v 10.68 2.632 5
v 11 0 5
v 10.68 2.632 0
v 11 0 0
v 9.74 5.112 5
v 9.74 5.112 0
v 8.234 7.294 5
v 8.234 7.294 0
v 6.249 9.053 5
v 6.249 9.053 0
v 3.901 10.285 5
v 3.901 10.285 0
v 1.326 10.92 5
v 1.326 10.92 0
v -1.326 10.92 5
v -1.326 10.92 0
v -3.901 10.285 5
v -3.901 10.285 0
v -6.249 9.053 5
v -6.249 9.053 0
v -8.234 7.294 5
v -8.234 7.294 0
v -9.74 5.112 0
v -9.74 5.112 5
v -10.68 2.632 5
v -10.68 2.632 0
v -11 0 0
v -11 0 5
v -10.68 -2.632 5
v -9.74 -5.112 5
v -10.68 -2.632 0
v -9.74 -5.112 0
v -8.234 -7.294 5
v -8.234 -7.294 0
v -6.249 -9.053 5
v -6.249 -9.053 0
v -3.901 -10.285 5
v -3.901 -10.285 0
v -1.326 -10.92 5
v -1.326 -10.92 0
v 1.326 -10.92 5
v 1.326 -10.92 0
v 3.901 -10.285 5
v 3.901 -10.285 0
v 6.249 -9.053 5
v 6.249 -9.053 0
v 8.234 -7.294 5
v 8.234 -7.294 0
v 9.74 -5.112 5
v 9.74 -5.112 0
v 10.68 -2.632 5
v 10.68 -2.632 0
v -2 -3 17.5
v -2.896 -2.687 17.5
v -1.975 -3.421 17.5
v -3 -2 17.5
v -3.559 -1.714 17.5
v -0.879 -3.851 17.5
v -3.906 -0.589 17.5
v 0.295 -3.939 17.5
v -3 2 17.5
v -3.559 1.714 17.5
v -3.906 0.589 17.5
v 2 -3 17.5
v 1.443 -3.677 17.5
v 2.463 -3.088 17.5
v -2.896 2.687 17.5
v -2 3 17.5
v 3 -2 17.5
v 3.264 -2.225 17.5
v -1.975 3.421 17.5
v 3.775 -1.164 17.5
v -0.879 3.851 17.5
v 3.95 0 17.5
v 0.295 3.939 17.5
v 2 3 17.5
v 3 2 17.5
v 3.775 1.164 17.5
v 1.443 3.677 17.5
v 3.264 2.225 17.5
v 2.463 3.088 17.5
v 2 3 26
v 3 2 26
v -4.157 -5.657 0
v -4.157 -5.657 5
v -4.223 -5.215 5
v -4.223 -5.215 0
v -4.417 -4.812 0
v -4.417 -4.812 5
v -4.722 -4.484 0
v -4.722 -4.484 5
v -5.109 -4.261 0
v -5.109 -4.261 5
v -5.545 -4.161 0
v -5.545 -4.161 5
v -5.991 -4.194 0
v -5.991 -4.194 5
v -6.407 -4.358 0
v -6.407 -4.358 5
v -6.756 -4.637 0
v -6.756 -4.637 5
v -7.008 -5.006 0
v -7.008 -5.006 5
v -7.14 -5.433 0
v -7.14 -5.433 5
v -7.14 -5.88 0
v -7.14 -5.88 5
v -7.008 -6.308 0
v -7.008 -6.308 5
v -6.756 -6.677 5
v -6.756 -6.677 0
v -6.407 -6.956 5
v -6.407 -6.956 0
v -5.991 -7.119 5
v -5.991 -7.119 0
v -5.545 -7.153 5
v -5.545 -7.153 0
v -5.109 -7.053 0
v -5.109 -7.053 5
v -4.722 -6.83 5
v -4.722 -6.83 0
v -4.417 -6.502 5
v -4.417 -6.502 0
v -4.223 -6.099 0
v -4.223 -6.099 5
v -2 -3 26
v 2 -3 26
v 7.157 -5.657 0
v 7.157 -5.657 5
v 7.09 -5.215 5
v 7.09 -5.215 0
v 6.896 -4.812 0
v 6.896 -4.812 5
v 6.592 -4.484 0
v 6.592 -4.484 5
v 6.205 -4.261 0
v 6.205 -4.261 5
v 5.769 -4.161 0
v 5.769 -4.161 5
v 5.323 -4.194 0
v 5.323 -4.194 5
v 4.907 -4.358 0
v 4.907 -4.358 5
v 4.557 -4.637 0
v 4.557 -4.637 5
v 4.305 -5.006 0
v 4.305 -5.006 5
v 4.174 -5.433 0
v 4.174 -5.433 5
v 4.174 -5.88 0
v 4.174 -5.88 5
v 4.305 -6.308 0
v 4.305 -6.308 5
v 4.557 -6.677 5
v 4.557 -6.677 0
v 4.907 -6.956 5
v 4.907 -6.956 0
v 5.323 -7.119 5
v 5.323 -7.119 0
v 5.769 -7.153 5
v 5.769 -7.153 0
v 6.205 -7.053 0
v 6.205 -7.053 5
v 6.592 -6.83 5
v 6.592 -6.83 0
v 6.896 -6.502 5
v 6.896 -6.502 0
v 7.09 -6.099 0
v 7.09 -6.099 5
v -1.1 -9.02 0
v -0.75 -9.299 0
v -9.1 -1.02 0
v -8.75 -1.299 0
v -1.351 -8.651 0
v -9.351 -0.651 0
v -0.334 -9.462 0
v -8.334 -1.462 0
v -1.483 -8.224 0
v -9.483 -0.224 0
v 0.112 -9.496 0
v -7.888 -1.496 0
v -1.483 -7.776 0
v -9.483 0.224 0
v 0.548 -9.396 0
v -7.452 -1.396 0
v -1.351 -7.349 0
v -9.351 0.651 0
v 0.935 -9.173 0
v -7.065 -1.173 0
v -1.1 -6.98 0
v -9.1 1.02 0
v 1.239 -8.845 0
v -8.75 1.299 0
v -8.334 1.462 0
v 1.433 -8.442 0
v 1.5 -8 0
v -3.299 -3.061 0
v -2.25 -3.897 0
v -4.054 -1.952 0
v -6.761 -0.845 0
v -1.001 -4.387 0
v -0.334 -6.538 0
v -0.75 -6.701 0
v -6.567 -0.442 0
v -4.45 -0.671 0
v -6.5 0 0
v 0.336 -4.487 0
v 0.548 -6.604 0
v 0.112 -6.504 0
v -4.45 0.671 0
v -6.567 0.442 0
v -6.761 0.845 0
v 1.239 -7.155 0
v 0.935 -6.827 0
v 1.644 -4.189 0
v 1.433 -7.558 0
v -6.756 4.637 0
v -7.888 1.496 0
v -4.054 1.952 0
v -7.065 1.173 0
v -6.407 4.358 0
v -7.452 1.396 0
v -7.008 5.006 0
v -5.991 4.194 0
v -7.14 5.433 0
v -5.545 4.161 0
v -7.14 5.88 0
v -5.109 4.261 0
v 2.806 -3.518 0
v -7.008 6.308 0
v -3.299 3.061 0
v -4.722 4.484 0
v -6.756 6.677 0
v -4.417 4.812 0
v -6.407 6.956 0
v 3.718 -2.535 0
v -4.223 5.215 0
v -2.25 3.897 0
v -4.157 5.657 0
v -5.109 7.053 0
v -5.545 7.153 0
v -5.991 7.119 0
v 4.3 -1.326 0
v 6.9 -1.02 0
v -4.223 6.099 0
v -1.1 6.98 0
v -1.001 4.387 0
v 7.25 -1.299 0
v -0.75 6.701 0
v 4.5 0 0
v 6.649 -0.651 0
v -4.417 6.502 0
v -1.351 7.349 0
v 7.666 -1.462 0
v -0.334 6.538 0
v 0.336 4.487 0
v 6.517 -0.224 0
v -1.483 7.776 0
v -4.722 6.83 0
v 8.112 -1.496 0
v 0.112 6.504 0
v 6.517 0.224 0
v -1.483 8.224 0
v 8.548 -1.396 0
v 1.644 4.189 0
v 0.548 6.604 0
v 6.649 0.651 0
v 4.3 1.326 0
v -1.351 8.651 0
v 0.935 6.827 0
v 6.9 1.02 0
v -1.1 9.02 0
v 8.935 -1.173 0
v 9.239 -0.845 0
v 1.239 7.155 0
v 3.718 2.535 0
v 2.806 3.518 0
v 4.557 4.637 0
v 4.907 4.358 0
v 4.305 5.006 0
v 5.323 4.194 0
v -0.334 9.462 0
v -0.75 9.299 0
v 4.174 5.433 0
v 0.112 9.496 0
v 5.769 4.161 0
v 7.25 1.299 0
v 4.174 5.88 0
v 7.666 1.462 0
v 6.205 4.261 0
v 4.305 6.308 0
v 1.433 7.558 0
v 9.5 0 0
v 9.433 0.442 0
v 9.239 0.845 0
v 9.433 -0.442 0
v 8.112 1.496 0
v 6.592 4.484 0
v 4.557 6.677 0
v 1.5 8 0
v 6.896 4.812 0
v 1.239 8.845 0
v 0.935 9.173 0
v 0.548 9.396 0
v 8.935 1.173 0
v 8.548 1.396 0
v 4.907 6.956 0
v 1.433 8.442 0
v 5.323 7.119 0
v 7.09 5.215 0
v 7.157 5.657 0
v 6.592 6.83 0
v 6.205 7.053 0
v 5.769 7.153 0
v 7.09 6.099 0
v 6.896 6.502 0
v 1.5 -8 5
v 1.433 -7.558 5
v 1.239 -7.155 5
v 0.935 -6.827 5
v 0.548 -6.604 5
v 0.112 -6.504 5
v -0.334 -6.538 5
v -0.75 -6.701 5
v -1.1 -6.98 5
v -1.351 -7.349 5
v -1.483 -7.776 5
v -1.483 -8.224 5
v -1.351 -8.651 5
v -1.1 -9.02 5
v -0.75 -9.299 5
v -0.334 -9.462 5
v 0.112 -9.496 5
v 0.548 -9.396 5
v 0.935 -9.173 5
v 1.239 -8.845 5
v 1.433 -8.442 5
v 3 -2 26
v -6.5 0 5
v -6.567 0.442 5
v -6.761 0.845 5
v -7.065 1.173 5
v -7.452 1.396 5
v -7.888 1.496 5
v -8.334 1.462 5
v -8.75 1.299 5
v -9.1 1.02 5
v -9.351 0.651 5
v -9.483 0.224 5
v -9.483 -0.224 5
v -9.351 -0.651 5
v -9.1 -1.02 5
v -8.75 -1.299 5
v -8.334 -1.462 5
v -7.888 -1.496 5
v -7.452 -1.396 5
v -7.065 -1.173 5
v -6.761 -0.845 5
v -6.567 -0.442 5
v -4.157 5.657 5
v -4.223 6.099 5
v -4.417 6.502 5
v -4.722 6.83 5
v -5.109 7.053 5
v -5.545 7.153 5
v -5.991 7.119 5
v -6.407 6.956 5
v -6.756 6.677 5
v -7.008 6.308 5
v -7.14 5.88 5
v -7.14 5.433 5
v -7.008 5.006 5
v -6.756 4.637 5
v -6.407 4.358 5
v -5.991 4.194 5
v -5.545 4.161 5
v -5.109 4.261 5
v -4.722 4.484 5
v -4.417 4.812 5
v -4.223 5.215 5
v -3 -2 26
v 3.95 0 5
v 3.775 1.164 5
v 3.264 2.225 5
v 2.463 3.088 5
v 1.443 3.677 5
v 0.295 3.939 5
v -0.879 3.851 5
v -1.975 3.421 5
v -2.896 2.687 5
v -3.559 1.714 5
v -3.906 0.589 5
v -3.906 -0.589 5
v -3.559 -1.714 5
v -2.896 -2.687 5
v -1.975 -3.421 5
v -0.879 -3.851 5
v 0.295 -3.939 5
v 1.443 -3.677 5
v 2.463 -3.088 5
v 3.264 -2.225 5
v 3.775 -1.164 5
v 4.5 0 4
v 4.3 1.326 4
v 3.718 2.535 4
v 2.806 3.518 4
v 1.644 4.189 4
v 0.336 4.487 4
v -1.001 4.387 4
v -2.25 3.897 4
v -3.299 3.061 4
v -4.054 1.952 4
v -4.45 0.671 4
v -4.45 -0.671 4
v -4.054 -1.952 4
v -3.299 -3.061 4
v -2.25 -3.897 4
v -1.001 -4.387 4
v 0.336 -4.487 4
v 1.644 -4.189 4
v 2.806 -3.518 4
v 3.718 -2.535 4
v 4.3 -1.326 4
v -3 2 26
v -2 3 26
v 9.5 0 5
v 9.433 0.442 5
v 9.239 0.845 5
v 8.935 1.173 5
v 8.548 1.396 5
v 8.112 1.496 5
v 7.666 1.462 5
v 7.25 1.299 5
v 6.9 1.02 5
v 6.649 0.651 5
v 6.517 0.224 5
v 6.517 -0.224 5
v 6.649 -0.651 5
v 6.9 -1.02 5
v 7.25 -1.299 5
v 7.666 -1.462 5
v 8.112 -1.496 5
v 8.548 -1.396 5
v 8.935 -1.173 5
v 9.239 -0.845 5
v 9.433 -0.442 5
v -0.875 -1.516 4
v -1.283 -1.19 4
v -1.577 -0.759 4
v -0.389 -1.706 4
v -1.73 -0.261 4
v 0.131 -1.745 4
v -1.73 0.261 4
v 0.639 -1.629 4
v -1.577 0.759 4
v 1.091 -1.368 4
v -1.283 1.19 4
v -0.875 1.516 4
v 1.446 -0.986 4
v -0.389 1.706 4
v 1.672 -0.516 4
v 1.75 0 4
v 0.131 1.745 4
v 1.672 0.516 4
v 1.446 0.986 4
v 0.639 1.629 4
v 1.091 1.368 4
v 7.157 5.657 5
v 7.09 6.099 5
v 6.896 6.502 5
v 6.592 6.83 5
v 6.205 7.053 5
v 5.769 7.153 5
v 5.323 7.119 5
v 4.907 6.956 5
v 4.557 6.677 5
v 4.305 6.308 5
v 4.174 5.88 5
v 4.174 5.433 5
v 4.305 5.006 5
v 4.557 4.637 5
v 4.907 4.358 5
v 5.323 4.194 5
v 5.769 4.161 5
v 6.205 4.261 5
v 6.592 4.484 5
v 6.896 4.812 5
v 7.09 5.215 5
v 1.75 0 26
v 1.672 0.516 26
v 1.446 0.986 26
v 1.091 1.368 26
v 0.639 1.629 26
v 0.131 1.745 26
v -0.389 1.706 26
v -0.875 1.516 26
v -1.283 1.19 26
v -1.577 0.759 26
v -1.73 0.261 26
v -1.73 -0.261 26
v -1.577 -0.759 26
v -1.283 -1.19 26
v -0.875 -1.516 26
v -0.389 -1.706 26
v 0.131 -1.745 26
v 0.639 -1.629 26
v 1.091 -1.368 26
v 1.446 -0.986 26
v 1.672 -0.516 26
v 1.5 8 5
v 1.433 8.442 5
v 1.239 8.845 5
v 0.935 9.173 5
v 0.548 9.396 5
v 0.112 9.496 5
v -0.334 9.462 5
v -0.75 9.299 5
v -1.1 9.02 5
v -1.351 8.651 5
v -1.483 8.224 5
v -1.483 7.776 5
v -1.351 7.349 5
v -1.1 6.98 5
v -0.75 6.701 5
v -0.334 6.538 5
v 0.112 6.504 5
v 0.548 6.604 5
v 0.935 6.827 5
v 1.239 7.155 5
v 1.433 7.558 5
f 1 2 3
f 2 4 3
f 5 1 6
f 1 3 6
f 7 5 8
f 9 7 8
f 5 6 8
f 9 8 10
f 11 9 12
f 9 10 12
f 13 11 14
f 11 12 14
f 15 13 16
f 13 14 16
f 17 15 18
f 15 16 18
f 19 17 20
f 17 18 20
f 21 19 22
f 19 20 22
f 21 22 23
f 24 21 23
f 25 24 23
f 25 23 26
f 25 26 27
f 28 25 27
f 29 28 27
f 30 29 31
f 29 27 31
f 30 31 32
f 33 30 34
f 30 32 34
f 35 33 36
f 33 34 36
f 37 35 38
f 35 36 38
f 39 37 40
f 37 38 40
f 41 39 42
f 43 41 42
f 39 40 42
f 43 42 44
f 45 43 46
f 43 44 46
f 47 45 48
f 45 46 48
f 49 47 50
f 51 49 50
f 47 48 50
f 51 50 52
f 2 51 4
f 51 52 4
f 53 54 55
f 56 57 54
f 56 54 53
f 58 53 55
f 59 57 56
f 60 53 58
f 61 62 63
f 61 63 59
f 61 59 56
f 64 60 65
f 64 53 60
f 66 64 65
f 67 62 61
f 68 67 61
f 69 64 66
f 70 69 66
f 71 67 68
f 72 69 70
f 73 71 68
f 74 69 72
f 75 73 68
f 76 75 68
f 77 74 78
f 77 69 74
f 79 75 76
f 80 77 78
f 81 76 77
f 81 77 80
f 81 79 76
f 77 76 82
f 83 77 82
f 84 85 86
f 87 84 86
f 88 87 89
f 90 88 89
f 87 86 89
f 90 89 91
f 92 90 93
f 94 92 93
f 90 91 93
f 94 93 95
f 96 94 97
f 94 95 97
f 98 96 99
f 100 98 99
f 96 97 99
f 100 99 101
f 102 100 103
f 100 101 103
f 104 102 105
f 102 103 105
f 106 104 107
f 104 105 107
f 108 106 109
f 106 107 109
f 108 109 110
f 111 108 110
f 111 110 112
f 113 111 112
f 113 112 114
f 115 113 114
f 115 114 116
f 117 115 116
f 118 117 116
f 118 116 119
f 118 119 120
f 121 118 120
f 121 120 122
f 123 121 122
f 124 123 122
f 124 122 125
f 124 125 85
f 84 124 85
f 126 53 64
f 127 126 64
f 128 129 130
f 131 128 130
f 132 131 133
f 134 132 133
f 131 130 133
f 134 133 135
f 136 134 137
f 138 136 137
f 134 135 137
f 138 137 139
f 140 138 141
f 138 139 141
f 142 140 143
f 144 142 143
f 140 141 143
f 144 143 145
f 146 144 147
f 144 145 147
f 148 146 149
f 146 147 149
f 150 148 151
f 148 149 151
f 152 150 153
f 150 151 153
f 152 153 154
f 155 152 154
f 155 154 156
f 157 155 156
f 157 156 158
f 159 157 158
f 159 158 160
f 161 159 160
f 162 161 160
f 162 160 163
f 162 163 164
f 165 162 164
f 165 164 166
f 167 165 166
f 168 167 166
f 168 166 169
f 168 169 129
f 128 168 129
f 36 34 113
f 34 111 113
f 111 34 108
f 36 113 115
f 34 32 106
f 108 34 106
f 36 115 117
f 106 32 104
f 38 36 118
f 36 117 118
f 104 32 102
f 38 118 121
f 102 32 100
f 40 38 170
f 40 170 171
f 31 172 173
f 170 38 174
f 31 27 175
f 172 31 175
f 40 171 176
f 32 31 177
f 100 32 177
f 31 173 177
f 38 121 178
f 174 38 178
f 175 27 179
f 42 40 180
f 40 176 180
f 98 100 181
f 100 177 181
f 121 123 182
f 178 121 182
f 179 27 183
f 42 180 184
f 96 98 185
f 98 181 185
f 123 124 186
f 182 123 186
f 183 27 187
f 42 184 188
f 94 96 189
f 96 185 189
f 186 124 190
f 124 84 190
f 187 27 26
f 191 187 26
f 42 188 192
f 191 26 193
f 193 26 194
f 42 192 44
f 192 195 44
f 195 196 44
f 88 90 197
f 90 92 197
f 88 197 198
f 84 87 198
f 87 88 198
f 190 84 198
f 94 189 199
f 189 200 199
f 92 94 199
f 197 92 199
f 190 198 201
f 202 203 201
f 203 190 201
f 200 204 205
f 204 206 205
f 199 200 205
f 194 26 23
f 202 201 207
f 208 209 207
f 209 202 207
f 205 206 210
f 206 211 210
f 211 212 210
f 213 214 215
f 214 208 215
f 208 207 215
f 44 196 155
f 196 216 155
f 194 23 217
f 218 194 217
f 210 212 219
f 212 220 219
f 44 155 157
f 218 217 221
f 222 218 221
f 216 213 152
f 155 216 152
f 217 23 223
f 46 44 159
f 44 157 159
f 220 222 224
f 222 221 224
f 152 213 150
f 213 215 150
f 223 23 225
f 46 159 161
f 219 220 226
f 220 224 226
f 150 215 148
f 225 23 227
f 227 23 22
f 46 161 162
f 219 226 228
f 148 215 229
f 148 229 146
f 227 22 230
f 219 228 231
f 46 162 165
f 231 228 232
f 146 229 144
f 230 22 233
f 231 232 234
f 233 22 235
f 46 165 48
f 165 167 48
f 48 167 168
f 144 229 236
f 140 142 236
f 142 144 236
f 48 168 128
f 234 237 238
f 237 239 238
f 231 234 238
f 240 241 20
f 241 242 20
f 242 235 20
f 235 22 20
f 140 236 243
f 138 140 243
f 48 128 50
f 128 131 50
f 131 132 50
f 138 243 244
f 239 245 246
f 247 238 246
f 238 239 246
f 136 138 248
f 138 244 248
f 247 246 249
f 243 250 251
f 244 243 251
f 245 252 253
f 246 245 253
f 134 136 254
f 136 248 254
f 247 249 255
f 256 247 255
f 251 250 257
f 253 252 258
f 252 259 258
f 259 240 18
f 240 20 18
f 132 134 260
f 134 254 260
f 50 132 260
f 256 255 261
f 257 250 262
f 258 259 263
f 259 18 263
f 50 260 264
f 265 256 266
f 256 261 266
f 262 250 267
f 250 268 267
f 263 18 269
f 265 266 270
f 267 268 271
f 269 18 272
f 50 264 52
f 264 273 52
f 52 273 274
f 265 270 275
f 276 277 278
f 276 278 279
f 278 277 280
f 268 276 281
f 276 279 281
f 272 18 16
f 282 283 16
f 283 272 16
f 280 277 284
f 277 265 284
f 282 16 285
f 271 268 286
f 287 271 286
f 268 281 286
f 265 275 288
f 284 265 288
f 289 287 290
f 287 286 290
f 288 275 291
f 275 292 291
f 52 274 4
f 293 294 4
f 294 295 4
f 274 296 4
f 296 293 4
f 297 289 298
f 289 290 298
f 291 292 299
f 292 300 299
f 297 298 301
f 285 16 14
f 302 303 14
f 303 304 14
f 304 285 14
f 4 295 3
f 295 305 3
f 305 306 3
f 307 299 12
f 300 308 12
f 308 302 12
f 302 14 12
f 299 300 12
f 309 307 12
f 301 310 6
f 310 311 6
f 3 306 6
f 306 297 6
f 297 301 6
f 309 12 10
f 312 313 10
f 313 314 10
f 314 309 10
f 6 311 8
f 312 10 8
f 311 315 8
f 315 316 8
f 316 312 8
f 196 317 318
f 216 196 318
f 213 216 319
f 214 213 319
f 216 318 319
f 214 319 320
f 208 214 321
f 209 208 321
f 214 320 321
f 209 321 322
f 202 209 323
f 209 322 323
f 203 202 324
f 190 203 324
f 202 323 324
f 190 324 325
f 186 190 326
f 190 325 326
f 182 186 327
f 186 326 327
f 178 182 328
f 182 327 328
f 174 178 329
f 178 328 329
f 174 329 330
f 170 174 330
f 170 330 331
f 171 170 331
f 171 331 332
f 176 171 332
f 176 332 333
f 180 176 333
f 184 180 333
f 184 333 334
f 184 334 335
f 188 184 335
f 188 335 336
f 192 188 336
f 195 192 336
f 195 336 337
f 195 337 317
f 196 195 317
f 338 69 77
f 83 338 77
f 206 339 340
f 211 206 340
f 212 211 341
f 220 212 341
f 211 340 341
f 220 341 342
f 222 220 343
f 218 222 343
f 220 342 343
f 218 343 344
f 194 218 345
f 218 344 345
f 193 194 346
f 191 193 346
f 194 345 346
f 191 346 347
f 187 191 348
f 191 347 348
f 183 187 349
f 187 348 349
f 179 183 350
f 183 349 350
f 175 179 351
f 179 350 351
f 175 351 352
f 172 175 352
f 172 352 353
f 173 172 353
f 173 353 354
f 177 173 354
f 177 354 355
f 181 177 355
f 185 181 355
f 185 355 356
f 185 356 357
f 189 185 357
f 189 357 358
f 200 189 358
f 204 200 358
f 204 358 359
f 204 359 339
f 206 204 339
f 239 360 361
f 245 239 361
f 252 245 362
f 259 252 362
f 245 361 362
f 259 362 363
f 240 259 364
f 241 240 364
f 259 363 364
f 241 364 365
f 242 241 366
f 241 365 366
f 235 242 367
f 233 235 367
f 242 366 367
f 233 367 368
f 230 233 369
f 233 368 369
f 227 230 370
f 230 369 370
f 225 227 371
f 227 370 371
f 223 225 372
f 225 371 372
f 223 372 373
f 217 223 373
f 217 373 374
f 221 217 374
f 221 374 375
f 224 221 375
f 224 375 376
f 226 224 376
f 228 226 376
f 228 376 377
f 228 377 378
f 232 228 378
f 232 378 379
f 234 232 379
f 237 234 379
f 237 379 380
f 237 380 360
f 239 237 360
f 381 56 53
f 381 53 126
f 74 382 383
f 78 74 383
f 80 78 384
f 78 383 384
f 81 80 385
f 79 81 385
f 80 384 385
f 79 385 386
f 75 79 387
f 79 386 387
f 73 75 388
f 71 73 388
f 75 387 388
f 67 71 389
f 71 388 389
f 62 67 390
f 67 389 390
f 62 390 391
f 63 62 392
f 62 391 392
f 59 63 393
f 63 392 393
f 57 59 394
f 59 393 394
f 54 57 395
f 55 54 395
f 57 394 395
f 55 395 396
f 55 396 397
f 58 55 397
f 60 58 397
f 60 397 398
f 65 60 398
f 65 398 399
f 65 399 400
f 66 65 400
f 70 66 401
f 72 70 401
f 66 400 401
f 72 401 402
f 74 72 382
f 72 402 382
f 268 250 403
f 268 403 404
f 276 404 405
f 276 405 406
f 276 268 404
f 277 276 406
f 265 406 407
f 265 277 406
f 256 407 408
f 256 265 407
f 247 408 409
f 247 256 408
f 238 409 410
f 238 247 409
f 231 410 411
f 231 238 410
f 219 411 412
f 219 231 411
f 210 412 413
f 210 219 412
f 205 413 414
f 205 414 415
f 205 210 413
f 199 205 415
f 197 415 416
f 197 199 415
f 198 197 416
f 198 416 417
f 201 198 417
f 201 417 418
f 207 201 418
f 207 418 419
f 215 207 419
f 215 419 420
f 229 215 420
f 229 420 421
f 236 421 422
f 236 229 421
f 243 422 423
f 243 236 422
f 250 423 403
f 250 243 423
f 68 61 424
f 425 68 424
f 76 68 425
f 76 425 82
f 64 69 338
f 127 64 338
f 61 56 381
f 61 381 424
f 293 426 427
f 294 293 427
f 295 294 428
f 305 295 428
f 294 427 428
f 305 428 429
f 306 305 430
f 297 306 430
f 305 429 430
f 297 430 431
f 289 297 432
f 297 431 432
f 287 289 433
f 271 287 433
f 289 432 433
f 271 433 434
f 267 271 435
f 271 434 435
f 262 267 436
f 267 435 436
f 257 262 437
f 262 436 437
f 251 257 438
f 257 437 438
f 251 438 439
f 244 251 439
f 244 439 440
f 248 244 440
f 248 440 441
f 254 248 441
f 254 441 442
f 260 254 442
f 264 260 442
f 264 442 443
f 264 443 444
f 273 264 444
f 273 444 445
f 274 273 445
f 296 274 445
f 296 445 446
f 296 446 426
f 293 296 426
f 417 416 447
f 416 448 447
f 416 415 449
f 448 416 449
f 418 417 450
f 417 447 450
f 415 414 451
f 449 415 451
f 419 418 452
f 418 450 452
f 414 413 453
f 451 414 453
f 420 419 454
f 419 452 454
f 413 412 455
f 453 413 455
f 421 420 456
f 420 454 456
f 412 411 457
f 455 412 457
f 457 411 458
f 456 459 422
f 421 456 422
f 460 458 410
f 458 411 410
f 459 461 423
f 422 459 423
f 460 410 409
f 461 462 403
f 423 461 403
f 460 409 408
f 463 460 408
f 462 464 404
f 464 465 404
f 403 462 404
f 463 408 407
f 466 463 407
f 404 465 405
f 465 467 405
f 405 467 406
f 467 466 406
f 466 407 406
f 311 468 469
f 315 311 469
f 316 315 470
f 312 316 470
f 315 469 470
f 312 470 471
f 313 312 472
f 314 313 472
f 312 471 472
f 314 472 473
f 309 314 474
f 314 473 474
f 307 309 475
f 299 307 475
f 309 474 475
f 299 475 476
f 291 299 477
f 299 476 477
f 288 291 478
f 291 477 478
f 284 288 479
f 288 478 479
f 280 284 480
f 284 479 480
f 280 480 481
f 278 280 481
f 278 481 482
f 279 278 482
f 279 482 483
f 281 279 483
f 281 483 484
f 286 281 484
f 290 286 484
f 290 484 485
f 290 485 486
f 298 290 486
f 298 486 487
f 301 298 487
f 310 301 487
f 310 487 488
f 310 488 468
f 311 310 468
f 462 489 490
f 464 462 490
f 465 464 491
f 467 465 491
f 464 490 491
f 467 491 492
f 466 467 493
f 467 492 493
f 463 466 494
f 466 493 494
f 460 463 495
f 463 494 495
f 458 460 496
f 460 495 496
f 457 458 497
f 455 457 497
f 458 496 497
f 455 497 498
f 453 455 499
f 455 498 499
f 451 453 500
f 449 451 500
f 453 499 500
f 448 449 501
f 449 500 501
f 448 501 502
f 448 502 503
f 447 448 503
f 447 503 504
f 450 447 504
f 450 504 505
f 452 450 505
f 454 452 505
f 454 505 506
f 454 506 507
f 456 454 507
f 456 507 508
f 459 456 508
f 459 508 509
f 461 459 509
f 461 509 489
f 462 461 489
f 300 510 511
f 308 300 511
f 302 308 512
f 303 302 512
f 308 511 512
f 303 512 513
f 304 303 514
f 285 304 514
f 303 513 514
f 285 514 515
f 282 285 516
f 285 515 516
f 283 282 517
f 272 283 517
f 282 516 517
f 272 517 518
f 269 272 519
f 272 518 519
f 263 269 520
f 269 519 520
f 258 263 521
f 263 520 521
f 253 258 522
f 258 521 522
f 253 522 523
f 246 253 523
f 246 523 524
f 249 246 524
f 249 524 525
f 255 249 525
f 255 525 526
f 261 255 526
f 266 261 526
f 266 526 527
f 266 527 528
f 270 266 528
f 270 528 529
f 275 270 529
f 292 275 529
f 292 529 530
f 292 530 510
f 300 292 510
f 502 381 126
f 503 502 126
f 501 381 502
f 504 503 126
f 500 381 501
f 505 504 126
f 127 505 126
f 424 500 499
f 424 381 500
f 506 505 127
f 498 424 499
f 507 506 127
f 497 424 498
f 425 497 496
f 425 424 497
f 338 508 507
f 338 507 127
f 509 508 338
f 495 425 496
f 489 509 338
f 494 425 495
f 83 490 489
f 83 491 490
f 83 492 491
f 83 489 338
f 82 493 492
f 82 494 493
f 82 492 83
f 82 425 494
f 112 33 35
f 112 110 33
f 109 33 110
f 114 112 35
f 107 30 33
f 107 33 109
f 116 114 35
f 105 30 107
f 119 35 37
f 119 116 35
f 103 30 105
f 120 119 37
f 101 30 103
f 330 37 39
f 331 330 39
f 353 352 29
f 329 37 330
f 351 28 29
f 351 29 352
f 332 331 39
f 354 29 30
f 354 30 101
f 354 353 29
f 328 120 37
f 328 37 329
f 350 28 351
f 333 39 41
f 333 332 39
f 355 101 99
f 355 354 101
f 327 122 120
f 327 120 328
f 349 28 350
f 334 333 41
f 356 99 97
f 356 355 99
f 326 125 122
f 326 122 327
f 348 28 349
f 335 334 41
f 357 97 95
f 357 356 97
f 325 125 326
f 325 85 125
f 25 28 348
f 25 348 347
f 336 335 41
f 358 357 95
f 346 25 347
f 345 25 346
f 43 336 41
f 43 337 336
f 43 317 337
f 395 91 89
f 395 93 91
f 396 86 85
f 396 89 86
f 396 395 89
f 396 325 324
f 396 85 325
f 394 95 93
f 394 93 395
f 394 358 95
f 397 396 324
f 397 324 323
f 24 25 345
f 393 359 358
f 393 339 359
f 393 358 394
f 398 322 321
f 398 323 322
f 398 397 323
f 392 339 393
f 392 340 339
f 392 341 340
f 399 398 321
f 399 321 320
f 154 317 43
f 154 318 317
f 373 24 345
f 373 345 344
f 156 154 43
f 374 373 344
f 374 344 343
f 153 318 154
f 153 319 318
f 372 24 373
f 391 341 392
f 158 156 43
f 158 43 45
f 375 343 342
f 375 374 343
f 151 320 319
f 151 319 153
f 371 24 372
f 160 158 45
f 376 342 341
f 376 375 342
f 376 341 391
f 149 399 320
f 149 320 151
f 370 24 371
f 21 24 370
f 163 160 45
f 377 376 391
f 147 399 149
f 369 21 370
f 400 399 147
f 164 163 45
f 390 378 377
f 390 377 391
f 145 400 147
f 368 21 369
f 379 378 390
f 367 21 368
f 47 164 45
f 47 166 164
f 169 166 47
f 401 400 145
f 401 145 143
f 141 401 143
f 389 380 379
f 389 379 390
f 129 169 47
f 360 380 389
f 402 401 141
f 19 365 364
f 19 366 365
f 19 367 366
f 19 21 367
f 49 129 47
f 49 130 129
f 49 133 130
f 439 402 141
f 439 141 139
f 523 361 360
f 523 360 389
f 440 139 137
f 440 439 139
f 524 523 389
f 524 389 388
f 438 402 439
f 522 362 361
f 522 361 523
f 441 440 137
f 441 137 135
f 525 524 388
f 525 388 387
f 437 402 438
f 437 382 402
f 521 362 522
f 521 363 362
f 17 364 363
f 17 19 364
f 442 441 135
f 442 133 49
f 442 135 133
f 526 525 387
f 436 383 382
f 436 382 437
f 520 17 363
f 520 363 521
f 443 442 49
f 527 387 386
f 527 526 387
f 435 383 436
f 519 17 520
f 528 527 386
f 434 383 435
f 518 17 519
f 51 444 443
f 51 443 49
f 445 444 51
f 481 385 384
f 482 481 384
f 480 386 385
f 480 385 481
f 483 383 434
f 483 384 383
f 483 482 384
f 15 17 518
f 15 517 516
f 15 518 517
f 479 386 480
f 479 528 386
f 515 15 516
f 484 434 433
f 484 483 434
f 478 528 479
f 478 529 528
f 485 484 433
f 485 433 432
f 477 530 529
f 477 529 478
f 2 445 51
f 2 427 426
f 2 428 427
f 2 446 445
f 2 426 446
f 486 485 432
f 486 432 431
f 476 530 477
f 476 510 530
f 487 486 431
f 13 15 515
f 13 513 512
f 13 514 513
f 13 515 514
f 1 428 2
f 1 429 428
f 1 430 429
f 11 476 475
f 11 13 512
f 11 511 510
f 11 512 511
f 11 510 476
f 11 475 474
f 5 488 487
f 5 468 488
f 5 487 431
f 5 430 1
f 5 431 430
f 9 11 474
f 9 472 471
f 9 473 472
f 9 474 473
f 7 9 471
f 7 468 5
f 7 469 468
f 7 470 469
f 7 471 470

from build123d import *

# Parameters (mm, degrees)
ESQUISSE1_R                  = 11
ESQUISSE1_R_2                = 4.5
BOSS_EXTRU_1_DEPTH           = 4
ESQUISSE4_R                  = 11
BOSS_EXTRU_2_DEPTH           = 1
ESQUISSE2_R                  = 1.5
ENL_V_MAT_EXTRU_1_DEPTH      = 1
ENL_V_MAT_EXTRU_1_DEPTH_BACK = 6
ESQUISSE5_W                  = 6
ESQUISSE5_H                  = 6
BOSS_EXTRU_3_DEPTH           = 21
CHANFREIN1_SIZE              = 1
ESQUISSE8_R                  = 3.95
BOSS_EXTRU_4_DEPTH           = 12.5
ESQUISSE6_R                  = 1.75
ENL_V_MAT_EXTRU_2_DEPTH      = 1
ENL_V_MAT_EXTRU_2_DEPTH_BACK = 27


with BuildPart() as part:
    # Esquisse1 → Boss.-Extru.1 (new body)
    with BuildSketch(Plane.XY):
        Circle(ESQUISSE1_R)
        Circle(ESQUISSE1_R_2, mode=Mode.SUBTRACT)
    extrude(amount=BOSS_EXTRU_1_DEPTH)

    # Esquisse4 → Boss.-Extru.2 (add)
    with BuildSketch(Plane.XY.offset(4)):
        Circle(ESQUISSE4_R)
    extrude(amount=BOSS_EXTRU_2_DEPTH)

    # Esquisse2 → Enlèv. mat.-Extru.1 (cut, two sides)
    with BuildSketch(Plane.XY.offset(5)) as enl_v_mat_extru_1_sk:
        with Locations((8, 0)):
            Circle(ESQUISSE2_R)
        with Locations((5.656854249, -5.656854249)):
            Circle(ESQUISSE2_R)
        with Locations((0, -8)):
            Circle(ESQUISSE2_R)
        with Locations((-5.656854249, -5.656854249)):
            Circle(ESQUISSE2_R)
        with Locations((-8, 0)):
            Circle(ESQUISSE2_R)
        with Locations((-5.656854249, 5.656854249)):
            Circle(ESQUISSE2_R)
        with Locations((0, 8)):
            Circle(ESQUISSE2_R)
        with Locations((5.656854249, 5.656854249)):
            Circle(ESQUISSE2_R)
    extrude(amount=ENL_V_MAT_EXTRU_1_DEPTH, mode=Mode.SUBTRACT)
    extrude(enl_v_mat_extru_1_sk.sketch, amount=-ENL_V_MAT_EXTRU_1_DEPTH_BACK, mode=Mode.SUBTRACT)

    # Esquisse5 → Boss.-Extru.3 (add)
    with BuildSketch(Plane.XY.offset(5)):
        Rectangle(ESQUISSE5_W, ESQUISSE5_H)
    extrude(amount=BOSS_EXTRU_3_DEPTH)

    # Chanfrein1
    chanfrein1_edges = [part.edges().sort_by_distance(p)[0] for p in [
        (-3, 3, 15.5),
        (-3, -3, 15.5),
        (3, -3, 15.5),
        (3, 3, 15.5),
    ]]
    chamfer(chanfrein1_edges, length=CHANFREIN1_SIZE)

    # Esquisse8 → Boss.-Extru.4 (add)
    with BuildSketch(Plane.XY.offset(5)):
        Circle(ESQUISSE8_R)
    extrude(amount=BOSS_EXTRU_4_DEPTH)

    # Esquisse6 → Enlèv. mat.-Extru.2 (cut, two sides)
    with BuildSketch(Plane.XY.offset(26)) as enl_v_mat_extru_2_sk:
        Circle(ESQUISSE6_R)
    extrude(amount=ENL_V_MAT_EXTRU_2_DEPTH, mode=Mode.SUBTRACT)
    extrude(enl_v_mat_extru_2_sk.sketch, amount=-ENL_V_MAT_EXTRU_2_DEPTH_BACK, mode=Mode.SUBTRACT)


solid = part.part
